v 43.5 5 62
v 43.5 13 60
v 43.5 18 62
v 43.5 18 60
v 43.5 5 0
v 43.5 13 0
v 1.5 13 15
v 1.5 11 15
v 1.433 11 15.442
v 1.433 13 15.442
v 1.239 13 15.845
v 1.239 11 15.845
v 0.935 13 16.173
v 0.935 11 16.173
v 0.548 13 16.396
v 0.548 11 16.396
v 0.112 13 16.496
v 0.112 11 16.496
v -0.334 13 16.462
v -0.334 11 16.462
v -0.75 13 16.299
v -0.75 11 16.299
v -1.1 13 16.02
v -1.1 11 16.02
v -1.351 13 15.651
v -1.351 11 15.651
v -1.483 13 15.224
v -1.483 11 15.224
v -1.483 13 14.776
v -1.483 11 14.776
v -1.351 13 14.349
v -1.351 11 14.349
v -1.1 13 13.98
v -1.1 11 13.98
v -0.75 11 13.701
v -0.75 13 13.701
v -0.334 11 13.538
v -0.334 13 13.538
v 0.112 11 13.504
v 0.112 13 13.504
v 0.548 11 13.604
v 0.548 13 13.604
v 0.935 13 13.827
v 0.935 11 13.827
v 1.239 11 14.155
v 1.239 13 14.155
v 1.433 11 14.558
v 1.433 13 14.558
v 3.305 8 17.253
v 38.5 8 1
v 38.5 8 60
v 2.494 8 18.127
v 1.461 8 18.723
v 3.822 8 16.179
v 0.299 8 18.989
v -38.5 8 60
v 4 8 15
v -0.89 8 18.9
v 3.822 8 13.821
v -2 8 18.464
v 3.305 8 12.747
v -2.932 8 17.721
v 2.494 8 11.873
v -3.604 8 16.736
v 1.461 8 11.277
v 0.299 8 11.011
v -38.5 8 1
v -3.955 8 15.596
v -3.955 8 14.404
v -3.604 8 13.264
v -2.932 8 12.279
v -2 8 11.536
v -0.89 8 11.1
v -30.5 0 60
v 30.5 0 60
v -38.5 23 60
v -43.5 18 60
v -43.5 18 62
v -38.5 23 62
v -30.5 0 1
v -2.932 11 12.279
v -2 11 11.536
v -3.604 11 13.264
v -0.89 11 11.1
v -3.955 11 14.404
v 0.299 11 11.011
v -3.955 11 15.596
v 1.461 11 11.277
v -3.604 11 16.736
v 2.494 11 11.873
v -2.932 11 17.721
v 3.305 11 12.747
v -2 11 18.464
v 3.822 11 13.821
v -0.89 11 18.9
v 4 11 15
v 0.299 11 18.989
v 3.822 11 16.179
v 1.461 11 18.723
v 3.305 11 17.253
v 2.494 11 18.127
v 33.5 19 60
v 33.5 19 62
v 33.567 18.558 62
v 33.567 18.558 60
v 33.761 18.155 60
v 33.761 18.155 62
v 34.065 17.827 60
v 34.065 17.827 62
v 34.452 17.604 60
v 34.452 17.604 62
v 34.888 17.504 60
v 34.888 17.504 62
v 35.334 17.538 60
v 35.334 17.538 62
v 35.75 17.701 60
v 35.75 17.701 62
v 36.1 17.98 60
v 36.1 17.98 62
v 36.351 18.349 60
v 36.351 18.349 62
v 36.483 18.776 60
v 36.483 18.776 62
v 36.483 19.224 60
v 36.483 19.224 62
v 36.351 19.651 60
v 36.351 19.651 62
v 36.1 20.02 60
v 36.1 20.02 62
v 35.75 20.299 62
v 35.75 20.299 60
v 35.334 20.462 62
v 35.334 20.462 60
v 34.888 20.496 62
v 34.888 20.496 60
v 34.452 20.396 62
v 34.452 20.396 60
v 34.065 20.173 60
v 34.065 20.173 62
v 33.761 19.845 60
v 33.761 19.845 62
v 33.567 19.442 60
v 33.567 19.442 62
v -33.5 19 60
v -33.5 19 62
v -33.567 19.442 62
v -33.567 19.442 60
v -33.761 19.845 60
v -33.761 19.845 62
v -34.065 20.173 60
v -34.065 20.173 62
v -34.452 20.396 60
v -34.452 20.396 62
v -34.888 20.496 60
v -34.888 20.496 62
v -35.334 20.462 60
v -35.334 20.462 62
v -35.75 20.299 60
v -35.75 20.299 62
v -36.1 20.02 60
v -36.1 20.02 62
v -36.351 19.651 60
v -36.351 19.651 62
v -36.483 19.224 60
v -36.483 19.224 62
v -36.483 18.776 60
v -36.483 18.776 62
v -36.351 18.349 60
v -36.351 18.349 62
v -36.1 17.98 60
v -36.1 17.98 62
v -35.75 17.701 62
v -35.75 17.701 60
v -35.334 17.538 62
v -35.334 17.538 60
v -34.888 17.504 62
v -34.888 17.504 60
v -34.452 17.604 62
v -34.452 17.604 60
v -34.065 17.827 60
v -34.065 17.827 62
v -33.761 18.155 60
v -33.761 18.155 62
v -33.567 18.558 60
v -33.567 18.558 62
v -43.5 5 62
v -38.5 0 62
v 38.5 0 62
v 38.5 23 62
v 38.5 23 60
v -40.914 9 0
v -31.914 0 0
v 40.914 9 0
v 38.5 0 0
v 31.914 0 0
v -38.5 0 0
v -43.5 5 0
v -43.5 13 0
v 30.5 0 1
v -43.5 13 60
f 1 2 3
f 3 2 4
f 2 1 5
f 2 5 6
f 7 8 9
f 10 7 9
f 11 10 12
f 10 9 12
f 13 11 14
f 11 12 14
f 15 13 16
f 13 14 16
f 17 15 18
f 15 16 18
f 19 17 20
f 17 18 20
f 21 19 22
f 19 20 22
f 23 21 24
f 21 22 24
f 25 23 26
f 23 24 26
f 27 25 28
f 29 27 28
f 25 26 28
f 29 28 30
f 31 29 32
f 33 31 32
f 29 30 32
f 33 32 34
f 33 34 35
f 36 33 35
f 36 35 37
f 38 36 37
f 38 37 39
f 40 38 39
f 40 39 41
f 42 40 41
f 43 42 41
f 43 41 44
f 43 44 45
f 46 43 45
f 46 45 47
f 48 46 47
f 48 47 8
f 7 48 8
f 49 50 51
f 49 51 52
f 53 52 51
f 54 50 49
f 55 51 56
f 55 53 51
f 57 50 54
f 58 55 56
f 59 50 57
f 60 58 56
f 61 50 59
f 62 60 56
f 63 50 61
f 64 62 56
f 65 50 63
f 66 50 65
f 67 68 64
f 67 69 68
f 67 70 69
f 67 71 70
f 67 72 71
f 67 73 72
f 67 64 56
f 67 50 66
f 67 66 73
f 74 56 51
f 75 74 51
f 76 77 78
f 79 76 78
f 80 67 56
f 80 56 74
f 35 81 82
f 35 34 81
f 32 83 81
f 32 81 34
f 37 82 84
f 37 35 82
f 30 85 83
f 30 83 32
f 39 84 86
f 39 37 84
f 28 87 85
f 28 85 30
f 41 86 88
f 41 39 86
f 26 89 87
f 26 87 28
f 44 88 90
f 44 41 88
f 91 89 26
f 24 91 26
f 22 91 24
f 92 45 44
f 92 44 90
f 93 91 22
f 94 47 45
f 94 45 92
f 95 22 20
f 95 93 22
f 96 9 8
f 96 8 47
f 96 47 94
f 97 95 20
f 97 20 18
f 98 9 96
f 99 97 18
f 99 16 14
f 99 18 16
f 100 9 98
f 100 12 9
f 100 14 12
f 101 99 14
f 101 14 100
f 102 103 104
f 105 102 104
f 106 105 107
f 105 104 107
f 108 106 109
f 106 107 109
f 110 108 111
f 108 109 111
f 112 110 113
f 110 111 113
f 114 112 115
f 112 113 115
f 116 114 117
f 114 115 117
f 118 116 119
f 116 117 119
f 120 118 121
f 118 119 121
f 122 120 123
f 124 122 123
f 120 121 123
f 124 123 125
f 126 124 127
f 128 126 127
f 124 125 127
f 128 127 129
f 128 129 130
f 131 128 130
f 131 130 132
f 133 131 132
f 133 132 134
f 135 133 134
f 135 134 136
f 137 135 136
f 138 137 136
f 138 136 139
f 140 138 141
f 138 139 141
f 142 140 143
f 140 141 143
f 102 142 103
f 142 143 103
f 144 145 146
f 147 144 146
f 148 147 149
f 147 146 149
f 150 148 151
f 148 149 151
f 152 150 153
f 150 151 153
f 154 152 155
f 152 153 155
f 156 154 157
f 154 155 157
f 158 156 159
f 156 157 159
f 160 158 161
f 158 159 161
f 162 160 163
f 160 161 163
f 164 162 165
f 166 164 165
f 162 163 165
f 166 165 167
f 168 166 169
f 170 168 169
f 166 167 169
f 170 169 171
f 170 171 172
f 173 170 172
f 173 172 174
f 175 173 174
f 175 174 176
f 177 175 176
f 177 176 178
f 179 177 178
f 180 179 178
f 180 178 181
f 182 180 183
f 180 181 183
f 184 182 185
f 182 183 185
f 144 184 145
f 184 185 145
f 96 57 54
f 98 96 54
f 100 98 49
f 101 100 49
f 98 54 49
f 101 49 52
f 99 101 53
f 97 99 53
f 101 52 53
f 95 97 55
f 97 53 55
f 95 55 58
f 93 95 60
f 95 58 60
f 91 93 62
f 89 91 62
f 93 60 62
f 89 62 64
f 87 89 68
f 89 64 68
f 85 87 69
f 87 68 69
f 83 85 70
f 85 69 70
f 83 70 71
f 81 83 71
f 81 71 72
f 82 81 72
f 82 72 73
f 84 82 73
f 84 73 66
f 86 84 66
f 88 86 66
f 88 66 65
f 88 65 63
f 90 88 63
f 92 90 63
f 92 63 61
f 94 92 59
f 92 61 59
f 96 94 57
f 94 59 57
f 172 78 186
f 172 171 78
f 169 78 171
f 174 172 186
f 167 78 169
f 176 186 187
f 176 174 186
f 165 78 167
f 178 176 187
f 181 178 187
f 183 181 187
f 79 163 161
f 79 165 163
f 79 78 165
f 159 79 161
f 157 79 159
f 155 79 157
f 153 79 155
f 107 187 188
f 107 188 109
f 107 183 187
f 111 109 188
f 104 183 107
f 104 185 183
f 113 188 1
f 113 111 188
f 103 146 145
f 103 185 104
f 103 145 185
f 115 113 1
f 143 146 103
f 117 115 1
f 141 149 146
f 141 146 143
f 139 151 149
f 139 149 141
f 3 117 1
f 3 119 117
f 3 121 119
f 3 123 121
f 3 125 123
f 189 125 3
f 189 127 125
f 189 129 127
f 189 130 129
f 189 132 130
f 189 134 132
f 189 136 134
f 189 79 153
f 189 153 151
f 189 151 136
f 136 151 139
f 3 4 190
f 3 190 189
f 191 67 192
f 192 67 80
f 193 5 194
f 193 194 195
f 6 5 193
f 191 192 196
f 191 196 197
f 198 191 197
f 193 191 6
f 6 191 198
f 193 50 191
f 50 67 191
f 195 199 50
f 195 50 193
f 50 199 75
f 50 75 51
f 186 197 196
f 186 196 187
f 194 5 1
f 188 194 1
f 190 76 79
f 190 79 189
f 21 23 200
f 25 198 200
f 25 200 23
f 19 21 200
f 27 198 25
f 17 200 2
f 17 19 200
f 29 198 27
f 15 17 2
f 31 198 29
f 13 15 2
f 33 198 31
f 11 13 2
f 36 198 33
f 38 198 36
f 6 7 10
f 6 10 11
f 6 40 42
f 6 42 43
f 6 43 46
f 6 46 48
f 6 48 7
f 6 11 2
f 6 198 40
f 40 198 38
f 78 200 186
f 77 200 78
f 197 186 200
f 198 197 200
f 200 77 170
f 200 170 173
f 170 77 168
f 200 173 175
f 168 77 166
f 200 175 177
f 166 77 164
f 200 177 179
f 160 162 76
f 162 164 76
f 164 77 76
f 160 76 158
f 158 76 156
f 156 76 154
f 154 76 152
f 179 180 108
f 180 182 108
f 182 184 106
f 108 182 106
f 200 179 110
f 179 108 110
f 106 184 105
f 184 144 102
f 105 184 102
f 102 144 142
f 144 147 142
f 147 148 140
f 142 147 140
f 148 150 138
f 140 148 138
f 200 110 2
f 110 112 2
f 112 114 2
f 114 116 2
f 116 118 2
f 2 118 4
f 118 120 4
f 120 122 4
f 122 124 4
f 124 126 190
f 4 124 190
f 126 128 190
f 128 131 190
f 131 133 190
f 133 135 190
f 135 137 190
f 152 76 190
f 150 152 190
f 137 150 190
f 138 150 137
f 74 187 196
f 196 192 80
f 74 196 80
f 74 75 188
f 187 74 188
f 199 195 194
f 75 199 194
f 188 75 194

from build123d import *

# Parameters (mm, degrees)
EXTRUDE_1_DEPTH     = 60
SKETCH_2_W          = 87
SKETCH_2_H          = 23
EXTRUDE_2_DEPTH     = 2
SKETCH_3_R          = 1.5
CUT_EXTRUDE_1_DEPTH = 2
SKETCH_4_R          = 1.5
CUT_EXTRUDE_2_DEPTH = 5
SKETCH_5_R          = 4
CUT_EXTRUDE_3_DEPTH = 3
CHAMFER_1_SIZE      = 1
CHAMFER_2_SIZE      = 5


with BuildPart() as part:
    # Эскиз1 → Бобышка-Вытянуть1 (new body)
    with BuildSketch(Plane.XY):
        Polygon((30.5, 0), (38.5, 8), (-38.5, 8), (-30.5, 0), (-43.5, 0), (-43.5, 13), (43.5, 13), (43.5, 0), align=None)
    extrude(amount=EXTRUDE_1_DEPTH)

    # Эскиз2 → Бобышка-Вытянуть2 (add)
    with BuildSketch(Plane.XY.offset(60)):
        with Locations((0, 11.5)):
            Rectangle(SKETCH_2_W, SKETCH_2_H)
    extrude(amount=EXTRUDE_2_DEPTH)

    # Эскиз3 → Вырез-Вытянуть1 (cut)
    with BuildSketch(Plane.XY.offset(62)):
        with Locations((-35, 19)):
            Circle(SKETCH_3_R)
        with Locations(Location((35, 19, 0), (0, 0, 180))):
            Circle(SKETCH_3_R)
    extrude(amount=-CUT_EXTRUDE_1_DEPTH, mode=Mode.SUBTRACT)

    # Эскиз4 → Вырез-Вытянуть2 (cut)
    with BuildSketch(Plane.XZ.offset(-8)):
        with Locations((0, 15)):
            Circle(SKETCH_4_R)
    extrude(amount=-CUT_EXTRUDE_2_DEPTH, mode=Mode.SUBTRACT)

    # Эскиз5 → Вырез-Вытянуть3 (cut)
    with BuildSketch(Plane.XZ.offset(-8)):
        with Locations((0, 15)):
            Circle(SKETCH_5_R)
    extrude(amount=-CUT_EXTRUDE_3_DEPTH, mode=Mode.SUBTRACT)

    # Фаска1
    chamfer_1_edges = [part.edges().sort_by_distance(p)[0] for p in [
        (0, 8, 0),
        (-34.5, 4, 0),
        (34.5, 4, 0),
    ]]
    chamfer(chamfer_1_edges, length=CHAMFER_1_SIZE)

    # Фаска2
    chamfer_2_edges = [part.edges().sort_by_distance(p)[0] for p in [
        (43.5, 0, 31),
        (-43.5, 0, 31),
        (-43.5, 23, 61),
        (43.5, 23, 61),
    ]]
    chamfer(chamfer_2_edges, length=CHAMFER_2_SIZE)


solid = part.part
